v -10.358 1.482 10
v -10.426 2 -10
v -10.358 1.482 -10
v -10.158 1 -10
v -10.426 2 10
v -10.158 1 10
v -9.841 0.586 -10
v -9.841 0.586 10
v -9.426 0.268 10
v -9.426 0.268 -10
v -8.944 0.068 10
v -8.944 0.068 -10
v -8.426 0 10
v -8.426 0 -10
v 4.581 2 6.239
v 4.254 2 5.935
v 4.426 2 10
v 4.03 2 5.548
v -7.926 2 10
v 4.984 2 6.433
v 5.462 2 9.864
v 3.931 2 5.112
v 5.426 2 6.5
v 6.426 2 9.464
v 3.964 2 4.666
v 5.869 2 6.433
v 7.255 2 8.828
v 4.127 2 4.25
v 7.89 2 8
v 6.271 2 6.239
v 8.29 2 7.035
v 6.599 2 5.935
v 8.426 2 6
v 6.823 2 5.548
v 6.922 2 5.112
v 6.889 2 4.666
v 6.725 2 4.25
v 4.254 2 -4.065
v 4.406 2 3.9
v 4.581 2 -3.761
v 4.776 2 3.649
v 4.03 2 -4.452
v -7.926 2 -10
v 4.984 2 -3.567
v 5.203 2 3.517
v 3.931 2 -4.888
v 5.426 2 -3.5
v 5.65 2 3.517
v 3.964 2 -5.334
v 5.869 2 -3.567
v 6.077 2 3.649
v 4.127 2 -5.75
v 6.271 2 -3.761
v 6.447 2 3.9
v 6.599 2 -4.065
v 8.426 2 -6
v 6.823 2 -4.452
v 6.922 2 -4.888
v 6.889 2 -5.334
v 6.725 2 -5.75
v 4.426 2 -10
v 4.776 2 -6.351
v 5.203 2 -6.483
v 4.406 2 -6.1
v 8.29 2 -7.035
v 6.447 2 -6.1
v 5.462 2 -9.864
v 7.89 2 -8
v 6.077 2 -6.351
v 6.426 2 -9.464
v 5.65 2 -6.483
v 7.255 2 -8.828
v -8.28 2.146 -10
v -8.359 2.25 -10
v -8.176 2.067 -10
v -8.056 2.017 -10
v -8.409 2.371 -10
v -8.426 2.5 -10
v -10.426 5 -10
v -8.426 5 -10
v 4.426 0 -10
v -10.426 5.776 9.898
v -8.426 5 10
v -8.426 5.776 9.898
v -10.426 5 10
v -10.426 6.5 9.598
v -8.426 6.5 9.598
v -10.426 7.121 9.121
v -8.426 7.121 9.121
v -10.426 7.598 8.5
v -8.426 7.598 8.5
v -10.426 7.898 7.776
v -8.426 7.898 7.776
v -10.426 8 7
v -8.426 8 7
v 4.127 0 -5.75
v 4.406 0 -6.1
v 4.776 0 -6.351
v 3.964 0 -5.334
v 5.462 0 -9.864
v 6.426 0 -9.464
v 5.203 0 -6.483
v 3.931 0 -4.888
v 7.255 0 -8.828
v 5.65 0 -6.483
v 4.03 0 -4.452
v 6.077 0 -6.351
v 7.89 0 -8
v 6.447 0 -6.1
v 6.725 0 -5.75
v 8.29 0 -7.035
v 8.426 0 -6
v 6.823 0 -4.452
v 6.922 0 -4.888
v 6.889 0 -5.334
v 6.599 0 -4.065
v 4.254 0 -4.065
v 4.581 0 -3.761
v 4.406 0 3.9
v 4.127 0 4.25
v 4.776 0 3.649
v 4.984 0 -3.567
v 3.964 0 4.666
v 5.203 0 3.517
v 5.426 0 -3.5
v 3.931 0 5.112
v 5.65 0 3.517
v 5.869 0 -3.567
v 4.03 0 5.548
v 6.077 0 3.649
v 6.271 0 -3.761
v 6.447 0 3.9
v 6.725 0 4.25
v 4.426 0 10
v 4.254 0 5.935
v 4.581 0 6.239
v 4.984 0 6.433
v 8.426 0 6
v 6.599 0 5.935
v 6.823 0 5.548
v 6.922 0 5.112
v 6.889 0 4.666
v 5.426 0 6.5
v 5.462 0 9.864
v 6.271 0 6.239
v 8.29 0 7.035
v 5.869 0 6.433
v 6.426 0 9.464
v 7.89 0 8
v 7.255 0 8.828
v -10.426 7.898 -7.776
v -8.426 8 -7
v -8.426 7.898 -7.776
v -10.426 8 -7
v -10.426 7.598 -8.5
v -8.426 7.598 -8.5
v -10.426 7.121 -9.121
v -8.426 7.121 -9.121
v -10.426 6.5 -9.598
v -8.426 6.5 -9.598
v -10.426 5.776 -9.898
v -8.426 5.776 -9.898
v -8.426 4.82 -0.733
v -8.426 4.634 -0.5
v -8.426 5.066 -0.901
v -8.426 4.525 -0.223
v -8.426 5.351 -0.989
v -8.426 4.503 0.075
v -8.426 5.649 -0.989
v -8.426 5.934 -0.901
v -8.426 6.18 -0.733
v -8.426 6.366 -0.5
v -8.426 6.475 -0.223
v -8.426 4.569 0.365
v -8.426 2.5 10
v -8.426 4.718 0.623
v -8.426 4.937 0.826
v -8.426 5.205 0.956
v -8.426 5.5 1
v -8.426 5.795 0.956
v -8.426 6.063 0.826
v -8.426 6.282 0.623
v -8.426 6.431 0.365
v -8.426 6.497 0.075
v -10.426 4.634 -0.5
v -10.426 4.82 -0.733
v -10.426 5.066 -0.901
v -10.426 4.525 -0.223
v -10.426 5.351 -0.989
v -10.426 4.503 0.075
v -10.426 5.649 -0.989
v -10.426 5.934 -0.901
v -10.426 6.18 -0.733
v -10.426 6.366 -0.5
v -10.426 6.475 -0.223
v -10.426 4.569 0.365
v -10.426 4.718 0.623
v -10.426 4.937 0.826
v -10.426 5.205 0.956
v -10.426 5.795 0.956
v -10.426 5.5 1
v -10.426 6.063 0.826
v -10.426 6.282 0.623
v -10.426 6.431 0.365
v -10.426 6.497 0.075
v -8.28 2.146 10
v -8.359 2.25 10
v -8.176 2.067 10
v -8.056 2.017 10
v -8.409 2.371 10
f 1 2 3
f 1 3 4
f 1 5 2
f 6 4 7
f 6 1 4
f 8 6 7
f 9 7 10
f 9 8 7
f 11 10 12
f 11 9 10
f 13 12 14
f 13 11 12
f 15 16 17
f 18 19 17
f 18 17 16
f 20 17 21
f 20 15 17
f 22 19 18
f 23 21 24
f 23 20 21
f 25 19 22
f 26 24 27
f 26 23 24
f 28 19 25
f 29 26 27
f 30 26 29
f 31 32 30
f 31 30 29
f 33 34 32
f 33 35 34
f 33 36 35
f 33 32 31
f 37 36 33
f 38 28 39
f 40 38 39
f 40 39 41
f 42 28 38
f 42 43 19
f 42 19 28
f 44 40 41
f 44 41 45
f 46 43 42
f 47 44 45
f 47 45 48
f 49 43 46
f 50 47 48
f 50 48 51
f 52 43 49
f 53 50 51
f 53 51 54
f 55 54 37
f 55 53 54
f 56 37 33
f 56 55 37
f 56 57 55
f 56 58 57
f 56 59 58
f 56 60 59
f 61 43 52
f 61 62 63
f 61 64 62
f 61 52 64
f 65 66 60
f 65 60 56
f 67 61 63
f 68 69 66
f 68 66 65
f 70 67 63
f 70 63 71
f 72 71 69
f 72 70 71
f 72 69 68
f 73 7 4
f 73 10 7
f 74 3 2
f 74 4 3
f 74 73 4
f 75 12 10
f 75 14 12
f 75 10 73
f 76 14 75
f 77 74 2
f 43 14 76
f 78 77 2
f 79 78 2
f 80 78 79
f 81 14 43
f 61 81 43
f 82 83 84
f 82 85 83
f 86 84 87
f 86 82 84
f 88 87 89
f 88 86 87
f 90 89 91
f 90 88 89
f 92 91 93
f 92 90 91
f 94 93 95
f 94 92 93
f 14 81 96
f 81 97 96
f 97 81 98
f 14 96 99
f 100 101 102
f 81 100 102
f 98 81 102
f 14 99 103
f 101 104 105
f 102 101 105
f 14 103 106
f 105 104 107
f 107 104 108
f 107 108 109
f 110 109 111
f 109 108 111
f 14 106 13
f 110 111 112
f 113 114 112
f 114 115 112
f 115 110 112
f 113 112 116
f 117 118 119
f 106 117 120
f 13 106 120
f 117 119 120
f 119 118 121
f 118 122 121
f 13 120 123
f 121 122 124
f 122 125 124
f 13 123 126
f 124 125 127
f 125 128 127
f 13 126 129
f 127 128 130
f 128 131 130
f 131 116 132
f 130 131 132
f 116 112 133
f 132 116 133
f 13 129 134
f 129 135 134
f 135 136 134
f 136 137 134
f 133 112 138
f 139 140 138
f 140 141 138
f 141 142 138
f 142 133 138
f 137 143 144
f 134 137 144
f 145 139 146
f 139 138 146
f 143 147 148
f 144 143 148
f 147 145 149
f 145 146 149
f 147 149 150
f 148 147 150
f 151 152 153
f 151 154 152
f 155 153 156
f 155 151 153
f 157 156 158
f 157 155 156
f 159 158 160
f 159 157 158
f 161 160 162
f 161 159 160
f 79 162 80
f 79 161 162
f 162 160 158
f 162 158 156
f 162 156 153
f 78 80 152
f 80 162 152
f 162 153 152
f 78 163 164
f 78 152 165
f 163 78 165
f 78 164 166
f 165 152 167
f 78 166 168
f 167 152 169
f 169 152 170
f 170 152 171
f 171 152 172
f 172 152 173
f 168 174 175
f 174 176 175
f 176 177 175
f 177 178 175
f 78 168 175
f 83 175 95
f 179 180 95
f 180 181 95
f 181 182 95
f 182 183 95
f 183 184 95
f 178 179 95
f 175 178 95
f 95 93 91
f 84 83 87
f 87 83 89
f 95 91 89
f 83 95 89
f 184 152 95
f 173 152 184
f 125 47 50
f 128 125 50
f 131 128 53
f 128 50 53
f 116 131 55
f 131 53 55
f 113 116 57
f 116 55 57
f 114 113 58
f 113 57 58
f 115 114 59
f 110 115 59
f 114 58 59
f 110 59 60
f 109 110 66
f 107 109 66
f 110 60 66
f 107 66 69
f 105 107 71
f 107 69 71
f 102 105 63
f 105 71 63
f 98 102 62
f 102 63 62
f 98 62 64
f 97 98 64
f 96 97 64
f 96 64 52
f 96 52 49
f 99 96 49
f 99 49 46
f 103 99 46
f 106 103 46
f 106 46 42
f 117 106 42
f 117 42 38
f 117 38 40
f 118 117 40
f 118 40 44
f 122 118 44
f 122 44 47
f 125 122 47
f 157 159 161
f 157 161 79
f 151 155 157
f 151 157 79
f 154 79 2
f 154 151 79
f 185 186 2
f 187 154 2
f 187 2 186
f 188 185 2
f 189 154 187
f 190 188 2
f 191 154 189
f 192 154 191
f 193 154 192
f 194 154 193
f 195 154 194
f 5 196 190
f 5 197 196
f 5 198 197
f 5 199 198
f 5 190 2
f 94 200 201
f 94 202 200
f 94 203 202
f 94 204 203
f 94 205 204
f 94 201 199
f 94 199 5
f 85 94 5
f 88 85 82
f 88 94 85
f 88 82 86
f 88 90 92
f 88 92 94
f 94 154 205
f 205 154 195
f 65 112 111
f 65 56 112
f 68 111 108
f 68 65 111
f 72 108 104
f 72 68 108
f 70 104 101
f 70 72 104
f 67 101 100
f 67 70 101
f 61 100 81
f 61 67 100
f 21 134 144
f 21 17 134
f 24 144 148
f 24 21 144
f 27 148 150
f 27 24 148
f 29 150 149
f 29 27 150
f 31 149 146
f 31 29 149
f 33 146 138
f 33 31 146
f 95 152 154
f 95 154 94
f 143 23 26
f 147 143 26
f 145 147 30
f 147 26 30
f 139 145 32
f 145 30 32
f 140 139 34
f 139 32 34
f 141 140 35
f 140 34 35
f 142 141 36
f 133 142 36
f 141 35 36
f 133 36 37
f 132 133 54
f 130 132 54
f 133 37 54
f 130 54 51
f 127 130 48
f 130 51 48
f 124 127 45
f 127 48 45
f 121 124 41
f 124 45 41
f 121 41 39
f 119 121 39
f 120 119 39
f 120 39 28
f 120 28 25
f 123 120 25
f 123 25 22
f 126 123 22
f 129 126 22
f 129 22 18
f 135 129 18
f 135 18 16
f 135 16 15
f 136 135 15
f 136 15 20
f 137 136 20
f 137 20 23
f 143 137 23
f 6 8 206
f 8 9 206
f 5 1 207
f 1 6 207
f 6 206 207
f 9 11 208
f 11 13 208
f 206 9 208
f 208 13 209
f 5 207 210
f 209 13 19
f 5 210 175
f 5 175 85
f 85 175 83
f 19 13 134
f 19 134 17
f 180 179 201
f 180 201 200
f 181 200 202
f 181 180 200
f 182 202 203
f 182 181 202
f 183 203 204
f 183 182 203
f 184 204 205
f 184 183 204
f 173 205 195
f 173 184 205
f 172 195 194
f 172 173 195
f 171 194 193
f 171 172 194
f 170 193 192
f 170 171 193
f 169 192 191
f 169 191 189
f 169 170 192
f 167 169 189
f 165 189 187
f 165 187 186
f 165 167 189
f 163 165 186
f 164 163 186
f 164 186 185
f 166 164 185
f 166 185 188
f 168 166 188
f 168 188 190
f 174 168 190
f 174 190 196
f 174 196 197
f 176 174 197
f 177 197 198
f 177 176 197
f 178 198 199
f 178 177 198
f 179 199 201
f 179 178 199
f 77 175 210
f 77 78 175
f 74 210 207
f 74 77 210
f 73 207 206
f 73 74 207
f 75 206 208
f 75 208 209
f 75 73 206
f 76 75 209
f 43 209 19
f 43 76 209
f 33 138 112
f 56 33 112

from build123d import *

# Parameters (mm, degrees)
SKETCH1_W           = 16.852791878
SKETCH1_H           = 20
BOSS_EXTRUDE1_DEPTH = 2
FILLET1_R           = 4
SKETCH2_W           = 20
SKETCH2_H           = 8
SKETCH2_R           = 1
BOSS_EXTRUDE2_DEPTH = 2
FILLET2_R           = 3
FILLET3_R           = 3
FILLET4_R           = 2
FILLET5_R           = 0.5
SKETCH3_R           = 1.5
CUT_EXTRUDE1_DEPTH  = 16.643200832


with BuildPart() as part:
    # Sketch1 → Boss-Extrude1 (new body)
    with BuildSketch(Plane(origin=(0, 0, 0), x_dir=(1, 0, 0), z_dir=(0, 1, 0))):
        Rectangle(SKETCH1_W, SKETCH1_H)
    extrude(amount=BOSS_EXTRUDE1_DEPTH)

    # Fillet1
    fillet1_edges = [part.edges().sort_by_distance(p)[0] for p in [
        (8.426395939, 1, 10),
        (8.426395939, 1, -10),
    ]]
    fillet(fillet1_edges, radius=FILLET1_R)

    # Sketch2 → Boss-Extrude2 (add)
    with BuildSketch(Plane.ZY.offset(8.426395939)):
        with Locations((0, 4)):
            Rectangle(SKETCH2_W, SKETCH2_H)
        with Locations((0, 5.5)):
            Circle(SKETCH2_R, mode=Mode.SUBTRACT)
    extrude(amount=BOSS_EXTRUDE2_DEPTH)

    # Fillet2
    fillet2_edges = [part.edges().sort_by_distance(p)[0] for p in [
        (-9.426395939, 8, 10),
    ]]
    fillet(fillet2_edges, radius=FILLET2_R)

    # Fillet3
    fillet3_edges = [part.edges().sort_by_distance(p)[0] for p in [
        (-9.426395939, 8, -10),
    ]]
    fillet(fillet3_edges, radius=FILLET3_R)

    # Fillet4
    fillet4_edges = [part.edges().sort_by_distance(p)[0] for p in [
        (-10.426395939, 0, 0),
    ]]
    fillet(fillet4_edges, radius=FILLET4_R)

    # Fillet5
    fillet5_edges = [part.edges().sort_by_distance(p)[0] for p in [
        (-8.426395939, 2, 0),
    ]]
    fillet(fillet5_edges, radius=FILLET5_R)

    # Sketch3 → Cut-Extrude1 (cut, through all)
    with BuildSketch(Plane(origin=(0, 2, 0), x_dir=(1, 0, 0), z_dir=(0, 1, 0))):
        with Locations(Location((5.426395939, 5, 0), (0, 0, 270))):
            Circle(SKETCH3_R)
        with Locations(Location((5.426395939, -5, 0), (0, 0, 270))):
            Circle(SKETCH3_R)
    extrude(amount=-CUT_EXTRUDE1_DEPTH, mode=Mode.SUBTRACT)


solid = part.part
